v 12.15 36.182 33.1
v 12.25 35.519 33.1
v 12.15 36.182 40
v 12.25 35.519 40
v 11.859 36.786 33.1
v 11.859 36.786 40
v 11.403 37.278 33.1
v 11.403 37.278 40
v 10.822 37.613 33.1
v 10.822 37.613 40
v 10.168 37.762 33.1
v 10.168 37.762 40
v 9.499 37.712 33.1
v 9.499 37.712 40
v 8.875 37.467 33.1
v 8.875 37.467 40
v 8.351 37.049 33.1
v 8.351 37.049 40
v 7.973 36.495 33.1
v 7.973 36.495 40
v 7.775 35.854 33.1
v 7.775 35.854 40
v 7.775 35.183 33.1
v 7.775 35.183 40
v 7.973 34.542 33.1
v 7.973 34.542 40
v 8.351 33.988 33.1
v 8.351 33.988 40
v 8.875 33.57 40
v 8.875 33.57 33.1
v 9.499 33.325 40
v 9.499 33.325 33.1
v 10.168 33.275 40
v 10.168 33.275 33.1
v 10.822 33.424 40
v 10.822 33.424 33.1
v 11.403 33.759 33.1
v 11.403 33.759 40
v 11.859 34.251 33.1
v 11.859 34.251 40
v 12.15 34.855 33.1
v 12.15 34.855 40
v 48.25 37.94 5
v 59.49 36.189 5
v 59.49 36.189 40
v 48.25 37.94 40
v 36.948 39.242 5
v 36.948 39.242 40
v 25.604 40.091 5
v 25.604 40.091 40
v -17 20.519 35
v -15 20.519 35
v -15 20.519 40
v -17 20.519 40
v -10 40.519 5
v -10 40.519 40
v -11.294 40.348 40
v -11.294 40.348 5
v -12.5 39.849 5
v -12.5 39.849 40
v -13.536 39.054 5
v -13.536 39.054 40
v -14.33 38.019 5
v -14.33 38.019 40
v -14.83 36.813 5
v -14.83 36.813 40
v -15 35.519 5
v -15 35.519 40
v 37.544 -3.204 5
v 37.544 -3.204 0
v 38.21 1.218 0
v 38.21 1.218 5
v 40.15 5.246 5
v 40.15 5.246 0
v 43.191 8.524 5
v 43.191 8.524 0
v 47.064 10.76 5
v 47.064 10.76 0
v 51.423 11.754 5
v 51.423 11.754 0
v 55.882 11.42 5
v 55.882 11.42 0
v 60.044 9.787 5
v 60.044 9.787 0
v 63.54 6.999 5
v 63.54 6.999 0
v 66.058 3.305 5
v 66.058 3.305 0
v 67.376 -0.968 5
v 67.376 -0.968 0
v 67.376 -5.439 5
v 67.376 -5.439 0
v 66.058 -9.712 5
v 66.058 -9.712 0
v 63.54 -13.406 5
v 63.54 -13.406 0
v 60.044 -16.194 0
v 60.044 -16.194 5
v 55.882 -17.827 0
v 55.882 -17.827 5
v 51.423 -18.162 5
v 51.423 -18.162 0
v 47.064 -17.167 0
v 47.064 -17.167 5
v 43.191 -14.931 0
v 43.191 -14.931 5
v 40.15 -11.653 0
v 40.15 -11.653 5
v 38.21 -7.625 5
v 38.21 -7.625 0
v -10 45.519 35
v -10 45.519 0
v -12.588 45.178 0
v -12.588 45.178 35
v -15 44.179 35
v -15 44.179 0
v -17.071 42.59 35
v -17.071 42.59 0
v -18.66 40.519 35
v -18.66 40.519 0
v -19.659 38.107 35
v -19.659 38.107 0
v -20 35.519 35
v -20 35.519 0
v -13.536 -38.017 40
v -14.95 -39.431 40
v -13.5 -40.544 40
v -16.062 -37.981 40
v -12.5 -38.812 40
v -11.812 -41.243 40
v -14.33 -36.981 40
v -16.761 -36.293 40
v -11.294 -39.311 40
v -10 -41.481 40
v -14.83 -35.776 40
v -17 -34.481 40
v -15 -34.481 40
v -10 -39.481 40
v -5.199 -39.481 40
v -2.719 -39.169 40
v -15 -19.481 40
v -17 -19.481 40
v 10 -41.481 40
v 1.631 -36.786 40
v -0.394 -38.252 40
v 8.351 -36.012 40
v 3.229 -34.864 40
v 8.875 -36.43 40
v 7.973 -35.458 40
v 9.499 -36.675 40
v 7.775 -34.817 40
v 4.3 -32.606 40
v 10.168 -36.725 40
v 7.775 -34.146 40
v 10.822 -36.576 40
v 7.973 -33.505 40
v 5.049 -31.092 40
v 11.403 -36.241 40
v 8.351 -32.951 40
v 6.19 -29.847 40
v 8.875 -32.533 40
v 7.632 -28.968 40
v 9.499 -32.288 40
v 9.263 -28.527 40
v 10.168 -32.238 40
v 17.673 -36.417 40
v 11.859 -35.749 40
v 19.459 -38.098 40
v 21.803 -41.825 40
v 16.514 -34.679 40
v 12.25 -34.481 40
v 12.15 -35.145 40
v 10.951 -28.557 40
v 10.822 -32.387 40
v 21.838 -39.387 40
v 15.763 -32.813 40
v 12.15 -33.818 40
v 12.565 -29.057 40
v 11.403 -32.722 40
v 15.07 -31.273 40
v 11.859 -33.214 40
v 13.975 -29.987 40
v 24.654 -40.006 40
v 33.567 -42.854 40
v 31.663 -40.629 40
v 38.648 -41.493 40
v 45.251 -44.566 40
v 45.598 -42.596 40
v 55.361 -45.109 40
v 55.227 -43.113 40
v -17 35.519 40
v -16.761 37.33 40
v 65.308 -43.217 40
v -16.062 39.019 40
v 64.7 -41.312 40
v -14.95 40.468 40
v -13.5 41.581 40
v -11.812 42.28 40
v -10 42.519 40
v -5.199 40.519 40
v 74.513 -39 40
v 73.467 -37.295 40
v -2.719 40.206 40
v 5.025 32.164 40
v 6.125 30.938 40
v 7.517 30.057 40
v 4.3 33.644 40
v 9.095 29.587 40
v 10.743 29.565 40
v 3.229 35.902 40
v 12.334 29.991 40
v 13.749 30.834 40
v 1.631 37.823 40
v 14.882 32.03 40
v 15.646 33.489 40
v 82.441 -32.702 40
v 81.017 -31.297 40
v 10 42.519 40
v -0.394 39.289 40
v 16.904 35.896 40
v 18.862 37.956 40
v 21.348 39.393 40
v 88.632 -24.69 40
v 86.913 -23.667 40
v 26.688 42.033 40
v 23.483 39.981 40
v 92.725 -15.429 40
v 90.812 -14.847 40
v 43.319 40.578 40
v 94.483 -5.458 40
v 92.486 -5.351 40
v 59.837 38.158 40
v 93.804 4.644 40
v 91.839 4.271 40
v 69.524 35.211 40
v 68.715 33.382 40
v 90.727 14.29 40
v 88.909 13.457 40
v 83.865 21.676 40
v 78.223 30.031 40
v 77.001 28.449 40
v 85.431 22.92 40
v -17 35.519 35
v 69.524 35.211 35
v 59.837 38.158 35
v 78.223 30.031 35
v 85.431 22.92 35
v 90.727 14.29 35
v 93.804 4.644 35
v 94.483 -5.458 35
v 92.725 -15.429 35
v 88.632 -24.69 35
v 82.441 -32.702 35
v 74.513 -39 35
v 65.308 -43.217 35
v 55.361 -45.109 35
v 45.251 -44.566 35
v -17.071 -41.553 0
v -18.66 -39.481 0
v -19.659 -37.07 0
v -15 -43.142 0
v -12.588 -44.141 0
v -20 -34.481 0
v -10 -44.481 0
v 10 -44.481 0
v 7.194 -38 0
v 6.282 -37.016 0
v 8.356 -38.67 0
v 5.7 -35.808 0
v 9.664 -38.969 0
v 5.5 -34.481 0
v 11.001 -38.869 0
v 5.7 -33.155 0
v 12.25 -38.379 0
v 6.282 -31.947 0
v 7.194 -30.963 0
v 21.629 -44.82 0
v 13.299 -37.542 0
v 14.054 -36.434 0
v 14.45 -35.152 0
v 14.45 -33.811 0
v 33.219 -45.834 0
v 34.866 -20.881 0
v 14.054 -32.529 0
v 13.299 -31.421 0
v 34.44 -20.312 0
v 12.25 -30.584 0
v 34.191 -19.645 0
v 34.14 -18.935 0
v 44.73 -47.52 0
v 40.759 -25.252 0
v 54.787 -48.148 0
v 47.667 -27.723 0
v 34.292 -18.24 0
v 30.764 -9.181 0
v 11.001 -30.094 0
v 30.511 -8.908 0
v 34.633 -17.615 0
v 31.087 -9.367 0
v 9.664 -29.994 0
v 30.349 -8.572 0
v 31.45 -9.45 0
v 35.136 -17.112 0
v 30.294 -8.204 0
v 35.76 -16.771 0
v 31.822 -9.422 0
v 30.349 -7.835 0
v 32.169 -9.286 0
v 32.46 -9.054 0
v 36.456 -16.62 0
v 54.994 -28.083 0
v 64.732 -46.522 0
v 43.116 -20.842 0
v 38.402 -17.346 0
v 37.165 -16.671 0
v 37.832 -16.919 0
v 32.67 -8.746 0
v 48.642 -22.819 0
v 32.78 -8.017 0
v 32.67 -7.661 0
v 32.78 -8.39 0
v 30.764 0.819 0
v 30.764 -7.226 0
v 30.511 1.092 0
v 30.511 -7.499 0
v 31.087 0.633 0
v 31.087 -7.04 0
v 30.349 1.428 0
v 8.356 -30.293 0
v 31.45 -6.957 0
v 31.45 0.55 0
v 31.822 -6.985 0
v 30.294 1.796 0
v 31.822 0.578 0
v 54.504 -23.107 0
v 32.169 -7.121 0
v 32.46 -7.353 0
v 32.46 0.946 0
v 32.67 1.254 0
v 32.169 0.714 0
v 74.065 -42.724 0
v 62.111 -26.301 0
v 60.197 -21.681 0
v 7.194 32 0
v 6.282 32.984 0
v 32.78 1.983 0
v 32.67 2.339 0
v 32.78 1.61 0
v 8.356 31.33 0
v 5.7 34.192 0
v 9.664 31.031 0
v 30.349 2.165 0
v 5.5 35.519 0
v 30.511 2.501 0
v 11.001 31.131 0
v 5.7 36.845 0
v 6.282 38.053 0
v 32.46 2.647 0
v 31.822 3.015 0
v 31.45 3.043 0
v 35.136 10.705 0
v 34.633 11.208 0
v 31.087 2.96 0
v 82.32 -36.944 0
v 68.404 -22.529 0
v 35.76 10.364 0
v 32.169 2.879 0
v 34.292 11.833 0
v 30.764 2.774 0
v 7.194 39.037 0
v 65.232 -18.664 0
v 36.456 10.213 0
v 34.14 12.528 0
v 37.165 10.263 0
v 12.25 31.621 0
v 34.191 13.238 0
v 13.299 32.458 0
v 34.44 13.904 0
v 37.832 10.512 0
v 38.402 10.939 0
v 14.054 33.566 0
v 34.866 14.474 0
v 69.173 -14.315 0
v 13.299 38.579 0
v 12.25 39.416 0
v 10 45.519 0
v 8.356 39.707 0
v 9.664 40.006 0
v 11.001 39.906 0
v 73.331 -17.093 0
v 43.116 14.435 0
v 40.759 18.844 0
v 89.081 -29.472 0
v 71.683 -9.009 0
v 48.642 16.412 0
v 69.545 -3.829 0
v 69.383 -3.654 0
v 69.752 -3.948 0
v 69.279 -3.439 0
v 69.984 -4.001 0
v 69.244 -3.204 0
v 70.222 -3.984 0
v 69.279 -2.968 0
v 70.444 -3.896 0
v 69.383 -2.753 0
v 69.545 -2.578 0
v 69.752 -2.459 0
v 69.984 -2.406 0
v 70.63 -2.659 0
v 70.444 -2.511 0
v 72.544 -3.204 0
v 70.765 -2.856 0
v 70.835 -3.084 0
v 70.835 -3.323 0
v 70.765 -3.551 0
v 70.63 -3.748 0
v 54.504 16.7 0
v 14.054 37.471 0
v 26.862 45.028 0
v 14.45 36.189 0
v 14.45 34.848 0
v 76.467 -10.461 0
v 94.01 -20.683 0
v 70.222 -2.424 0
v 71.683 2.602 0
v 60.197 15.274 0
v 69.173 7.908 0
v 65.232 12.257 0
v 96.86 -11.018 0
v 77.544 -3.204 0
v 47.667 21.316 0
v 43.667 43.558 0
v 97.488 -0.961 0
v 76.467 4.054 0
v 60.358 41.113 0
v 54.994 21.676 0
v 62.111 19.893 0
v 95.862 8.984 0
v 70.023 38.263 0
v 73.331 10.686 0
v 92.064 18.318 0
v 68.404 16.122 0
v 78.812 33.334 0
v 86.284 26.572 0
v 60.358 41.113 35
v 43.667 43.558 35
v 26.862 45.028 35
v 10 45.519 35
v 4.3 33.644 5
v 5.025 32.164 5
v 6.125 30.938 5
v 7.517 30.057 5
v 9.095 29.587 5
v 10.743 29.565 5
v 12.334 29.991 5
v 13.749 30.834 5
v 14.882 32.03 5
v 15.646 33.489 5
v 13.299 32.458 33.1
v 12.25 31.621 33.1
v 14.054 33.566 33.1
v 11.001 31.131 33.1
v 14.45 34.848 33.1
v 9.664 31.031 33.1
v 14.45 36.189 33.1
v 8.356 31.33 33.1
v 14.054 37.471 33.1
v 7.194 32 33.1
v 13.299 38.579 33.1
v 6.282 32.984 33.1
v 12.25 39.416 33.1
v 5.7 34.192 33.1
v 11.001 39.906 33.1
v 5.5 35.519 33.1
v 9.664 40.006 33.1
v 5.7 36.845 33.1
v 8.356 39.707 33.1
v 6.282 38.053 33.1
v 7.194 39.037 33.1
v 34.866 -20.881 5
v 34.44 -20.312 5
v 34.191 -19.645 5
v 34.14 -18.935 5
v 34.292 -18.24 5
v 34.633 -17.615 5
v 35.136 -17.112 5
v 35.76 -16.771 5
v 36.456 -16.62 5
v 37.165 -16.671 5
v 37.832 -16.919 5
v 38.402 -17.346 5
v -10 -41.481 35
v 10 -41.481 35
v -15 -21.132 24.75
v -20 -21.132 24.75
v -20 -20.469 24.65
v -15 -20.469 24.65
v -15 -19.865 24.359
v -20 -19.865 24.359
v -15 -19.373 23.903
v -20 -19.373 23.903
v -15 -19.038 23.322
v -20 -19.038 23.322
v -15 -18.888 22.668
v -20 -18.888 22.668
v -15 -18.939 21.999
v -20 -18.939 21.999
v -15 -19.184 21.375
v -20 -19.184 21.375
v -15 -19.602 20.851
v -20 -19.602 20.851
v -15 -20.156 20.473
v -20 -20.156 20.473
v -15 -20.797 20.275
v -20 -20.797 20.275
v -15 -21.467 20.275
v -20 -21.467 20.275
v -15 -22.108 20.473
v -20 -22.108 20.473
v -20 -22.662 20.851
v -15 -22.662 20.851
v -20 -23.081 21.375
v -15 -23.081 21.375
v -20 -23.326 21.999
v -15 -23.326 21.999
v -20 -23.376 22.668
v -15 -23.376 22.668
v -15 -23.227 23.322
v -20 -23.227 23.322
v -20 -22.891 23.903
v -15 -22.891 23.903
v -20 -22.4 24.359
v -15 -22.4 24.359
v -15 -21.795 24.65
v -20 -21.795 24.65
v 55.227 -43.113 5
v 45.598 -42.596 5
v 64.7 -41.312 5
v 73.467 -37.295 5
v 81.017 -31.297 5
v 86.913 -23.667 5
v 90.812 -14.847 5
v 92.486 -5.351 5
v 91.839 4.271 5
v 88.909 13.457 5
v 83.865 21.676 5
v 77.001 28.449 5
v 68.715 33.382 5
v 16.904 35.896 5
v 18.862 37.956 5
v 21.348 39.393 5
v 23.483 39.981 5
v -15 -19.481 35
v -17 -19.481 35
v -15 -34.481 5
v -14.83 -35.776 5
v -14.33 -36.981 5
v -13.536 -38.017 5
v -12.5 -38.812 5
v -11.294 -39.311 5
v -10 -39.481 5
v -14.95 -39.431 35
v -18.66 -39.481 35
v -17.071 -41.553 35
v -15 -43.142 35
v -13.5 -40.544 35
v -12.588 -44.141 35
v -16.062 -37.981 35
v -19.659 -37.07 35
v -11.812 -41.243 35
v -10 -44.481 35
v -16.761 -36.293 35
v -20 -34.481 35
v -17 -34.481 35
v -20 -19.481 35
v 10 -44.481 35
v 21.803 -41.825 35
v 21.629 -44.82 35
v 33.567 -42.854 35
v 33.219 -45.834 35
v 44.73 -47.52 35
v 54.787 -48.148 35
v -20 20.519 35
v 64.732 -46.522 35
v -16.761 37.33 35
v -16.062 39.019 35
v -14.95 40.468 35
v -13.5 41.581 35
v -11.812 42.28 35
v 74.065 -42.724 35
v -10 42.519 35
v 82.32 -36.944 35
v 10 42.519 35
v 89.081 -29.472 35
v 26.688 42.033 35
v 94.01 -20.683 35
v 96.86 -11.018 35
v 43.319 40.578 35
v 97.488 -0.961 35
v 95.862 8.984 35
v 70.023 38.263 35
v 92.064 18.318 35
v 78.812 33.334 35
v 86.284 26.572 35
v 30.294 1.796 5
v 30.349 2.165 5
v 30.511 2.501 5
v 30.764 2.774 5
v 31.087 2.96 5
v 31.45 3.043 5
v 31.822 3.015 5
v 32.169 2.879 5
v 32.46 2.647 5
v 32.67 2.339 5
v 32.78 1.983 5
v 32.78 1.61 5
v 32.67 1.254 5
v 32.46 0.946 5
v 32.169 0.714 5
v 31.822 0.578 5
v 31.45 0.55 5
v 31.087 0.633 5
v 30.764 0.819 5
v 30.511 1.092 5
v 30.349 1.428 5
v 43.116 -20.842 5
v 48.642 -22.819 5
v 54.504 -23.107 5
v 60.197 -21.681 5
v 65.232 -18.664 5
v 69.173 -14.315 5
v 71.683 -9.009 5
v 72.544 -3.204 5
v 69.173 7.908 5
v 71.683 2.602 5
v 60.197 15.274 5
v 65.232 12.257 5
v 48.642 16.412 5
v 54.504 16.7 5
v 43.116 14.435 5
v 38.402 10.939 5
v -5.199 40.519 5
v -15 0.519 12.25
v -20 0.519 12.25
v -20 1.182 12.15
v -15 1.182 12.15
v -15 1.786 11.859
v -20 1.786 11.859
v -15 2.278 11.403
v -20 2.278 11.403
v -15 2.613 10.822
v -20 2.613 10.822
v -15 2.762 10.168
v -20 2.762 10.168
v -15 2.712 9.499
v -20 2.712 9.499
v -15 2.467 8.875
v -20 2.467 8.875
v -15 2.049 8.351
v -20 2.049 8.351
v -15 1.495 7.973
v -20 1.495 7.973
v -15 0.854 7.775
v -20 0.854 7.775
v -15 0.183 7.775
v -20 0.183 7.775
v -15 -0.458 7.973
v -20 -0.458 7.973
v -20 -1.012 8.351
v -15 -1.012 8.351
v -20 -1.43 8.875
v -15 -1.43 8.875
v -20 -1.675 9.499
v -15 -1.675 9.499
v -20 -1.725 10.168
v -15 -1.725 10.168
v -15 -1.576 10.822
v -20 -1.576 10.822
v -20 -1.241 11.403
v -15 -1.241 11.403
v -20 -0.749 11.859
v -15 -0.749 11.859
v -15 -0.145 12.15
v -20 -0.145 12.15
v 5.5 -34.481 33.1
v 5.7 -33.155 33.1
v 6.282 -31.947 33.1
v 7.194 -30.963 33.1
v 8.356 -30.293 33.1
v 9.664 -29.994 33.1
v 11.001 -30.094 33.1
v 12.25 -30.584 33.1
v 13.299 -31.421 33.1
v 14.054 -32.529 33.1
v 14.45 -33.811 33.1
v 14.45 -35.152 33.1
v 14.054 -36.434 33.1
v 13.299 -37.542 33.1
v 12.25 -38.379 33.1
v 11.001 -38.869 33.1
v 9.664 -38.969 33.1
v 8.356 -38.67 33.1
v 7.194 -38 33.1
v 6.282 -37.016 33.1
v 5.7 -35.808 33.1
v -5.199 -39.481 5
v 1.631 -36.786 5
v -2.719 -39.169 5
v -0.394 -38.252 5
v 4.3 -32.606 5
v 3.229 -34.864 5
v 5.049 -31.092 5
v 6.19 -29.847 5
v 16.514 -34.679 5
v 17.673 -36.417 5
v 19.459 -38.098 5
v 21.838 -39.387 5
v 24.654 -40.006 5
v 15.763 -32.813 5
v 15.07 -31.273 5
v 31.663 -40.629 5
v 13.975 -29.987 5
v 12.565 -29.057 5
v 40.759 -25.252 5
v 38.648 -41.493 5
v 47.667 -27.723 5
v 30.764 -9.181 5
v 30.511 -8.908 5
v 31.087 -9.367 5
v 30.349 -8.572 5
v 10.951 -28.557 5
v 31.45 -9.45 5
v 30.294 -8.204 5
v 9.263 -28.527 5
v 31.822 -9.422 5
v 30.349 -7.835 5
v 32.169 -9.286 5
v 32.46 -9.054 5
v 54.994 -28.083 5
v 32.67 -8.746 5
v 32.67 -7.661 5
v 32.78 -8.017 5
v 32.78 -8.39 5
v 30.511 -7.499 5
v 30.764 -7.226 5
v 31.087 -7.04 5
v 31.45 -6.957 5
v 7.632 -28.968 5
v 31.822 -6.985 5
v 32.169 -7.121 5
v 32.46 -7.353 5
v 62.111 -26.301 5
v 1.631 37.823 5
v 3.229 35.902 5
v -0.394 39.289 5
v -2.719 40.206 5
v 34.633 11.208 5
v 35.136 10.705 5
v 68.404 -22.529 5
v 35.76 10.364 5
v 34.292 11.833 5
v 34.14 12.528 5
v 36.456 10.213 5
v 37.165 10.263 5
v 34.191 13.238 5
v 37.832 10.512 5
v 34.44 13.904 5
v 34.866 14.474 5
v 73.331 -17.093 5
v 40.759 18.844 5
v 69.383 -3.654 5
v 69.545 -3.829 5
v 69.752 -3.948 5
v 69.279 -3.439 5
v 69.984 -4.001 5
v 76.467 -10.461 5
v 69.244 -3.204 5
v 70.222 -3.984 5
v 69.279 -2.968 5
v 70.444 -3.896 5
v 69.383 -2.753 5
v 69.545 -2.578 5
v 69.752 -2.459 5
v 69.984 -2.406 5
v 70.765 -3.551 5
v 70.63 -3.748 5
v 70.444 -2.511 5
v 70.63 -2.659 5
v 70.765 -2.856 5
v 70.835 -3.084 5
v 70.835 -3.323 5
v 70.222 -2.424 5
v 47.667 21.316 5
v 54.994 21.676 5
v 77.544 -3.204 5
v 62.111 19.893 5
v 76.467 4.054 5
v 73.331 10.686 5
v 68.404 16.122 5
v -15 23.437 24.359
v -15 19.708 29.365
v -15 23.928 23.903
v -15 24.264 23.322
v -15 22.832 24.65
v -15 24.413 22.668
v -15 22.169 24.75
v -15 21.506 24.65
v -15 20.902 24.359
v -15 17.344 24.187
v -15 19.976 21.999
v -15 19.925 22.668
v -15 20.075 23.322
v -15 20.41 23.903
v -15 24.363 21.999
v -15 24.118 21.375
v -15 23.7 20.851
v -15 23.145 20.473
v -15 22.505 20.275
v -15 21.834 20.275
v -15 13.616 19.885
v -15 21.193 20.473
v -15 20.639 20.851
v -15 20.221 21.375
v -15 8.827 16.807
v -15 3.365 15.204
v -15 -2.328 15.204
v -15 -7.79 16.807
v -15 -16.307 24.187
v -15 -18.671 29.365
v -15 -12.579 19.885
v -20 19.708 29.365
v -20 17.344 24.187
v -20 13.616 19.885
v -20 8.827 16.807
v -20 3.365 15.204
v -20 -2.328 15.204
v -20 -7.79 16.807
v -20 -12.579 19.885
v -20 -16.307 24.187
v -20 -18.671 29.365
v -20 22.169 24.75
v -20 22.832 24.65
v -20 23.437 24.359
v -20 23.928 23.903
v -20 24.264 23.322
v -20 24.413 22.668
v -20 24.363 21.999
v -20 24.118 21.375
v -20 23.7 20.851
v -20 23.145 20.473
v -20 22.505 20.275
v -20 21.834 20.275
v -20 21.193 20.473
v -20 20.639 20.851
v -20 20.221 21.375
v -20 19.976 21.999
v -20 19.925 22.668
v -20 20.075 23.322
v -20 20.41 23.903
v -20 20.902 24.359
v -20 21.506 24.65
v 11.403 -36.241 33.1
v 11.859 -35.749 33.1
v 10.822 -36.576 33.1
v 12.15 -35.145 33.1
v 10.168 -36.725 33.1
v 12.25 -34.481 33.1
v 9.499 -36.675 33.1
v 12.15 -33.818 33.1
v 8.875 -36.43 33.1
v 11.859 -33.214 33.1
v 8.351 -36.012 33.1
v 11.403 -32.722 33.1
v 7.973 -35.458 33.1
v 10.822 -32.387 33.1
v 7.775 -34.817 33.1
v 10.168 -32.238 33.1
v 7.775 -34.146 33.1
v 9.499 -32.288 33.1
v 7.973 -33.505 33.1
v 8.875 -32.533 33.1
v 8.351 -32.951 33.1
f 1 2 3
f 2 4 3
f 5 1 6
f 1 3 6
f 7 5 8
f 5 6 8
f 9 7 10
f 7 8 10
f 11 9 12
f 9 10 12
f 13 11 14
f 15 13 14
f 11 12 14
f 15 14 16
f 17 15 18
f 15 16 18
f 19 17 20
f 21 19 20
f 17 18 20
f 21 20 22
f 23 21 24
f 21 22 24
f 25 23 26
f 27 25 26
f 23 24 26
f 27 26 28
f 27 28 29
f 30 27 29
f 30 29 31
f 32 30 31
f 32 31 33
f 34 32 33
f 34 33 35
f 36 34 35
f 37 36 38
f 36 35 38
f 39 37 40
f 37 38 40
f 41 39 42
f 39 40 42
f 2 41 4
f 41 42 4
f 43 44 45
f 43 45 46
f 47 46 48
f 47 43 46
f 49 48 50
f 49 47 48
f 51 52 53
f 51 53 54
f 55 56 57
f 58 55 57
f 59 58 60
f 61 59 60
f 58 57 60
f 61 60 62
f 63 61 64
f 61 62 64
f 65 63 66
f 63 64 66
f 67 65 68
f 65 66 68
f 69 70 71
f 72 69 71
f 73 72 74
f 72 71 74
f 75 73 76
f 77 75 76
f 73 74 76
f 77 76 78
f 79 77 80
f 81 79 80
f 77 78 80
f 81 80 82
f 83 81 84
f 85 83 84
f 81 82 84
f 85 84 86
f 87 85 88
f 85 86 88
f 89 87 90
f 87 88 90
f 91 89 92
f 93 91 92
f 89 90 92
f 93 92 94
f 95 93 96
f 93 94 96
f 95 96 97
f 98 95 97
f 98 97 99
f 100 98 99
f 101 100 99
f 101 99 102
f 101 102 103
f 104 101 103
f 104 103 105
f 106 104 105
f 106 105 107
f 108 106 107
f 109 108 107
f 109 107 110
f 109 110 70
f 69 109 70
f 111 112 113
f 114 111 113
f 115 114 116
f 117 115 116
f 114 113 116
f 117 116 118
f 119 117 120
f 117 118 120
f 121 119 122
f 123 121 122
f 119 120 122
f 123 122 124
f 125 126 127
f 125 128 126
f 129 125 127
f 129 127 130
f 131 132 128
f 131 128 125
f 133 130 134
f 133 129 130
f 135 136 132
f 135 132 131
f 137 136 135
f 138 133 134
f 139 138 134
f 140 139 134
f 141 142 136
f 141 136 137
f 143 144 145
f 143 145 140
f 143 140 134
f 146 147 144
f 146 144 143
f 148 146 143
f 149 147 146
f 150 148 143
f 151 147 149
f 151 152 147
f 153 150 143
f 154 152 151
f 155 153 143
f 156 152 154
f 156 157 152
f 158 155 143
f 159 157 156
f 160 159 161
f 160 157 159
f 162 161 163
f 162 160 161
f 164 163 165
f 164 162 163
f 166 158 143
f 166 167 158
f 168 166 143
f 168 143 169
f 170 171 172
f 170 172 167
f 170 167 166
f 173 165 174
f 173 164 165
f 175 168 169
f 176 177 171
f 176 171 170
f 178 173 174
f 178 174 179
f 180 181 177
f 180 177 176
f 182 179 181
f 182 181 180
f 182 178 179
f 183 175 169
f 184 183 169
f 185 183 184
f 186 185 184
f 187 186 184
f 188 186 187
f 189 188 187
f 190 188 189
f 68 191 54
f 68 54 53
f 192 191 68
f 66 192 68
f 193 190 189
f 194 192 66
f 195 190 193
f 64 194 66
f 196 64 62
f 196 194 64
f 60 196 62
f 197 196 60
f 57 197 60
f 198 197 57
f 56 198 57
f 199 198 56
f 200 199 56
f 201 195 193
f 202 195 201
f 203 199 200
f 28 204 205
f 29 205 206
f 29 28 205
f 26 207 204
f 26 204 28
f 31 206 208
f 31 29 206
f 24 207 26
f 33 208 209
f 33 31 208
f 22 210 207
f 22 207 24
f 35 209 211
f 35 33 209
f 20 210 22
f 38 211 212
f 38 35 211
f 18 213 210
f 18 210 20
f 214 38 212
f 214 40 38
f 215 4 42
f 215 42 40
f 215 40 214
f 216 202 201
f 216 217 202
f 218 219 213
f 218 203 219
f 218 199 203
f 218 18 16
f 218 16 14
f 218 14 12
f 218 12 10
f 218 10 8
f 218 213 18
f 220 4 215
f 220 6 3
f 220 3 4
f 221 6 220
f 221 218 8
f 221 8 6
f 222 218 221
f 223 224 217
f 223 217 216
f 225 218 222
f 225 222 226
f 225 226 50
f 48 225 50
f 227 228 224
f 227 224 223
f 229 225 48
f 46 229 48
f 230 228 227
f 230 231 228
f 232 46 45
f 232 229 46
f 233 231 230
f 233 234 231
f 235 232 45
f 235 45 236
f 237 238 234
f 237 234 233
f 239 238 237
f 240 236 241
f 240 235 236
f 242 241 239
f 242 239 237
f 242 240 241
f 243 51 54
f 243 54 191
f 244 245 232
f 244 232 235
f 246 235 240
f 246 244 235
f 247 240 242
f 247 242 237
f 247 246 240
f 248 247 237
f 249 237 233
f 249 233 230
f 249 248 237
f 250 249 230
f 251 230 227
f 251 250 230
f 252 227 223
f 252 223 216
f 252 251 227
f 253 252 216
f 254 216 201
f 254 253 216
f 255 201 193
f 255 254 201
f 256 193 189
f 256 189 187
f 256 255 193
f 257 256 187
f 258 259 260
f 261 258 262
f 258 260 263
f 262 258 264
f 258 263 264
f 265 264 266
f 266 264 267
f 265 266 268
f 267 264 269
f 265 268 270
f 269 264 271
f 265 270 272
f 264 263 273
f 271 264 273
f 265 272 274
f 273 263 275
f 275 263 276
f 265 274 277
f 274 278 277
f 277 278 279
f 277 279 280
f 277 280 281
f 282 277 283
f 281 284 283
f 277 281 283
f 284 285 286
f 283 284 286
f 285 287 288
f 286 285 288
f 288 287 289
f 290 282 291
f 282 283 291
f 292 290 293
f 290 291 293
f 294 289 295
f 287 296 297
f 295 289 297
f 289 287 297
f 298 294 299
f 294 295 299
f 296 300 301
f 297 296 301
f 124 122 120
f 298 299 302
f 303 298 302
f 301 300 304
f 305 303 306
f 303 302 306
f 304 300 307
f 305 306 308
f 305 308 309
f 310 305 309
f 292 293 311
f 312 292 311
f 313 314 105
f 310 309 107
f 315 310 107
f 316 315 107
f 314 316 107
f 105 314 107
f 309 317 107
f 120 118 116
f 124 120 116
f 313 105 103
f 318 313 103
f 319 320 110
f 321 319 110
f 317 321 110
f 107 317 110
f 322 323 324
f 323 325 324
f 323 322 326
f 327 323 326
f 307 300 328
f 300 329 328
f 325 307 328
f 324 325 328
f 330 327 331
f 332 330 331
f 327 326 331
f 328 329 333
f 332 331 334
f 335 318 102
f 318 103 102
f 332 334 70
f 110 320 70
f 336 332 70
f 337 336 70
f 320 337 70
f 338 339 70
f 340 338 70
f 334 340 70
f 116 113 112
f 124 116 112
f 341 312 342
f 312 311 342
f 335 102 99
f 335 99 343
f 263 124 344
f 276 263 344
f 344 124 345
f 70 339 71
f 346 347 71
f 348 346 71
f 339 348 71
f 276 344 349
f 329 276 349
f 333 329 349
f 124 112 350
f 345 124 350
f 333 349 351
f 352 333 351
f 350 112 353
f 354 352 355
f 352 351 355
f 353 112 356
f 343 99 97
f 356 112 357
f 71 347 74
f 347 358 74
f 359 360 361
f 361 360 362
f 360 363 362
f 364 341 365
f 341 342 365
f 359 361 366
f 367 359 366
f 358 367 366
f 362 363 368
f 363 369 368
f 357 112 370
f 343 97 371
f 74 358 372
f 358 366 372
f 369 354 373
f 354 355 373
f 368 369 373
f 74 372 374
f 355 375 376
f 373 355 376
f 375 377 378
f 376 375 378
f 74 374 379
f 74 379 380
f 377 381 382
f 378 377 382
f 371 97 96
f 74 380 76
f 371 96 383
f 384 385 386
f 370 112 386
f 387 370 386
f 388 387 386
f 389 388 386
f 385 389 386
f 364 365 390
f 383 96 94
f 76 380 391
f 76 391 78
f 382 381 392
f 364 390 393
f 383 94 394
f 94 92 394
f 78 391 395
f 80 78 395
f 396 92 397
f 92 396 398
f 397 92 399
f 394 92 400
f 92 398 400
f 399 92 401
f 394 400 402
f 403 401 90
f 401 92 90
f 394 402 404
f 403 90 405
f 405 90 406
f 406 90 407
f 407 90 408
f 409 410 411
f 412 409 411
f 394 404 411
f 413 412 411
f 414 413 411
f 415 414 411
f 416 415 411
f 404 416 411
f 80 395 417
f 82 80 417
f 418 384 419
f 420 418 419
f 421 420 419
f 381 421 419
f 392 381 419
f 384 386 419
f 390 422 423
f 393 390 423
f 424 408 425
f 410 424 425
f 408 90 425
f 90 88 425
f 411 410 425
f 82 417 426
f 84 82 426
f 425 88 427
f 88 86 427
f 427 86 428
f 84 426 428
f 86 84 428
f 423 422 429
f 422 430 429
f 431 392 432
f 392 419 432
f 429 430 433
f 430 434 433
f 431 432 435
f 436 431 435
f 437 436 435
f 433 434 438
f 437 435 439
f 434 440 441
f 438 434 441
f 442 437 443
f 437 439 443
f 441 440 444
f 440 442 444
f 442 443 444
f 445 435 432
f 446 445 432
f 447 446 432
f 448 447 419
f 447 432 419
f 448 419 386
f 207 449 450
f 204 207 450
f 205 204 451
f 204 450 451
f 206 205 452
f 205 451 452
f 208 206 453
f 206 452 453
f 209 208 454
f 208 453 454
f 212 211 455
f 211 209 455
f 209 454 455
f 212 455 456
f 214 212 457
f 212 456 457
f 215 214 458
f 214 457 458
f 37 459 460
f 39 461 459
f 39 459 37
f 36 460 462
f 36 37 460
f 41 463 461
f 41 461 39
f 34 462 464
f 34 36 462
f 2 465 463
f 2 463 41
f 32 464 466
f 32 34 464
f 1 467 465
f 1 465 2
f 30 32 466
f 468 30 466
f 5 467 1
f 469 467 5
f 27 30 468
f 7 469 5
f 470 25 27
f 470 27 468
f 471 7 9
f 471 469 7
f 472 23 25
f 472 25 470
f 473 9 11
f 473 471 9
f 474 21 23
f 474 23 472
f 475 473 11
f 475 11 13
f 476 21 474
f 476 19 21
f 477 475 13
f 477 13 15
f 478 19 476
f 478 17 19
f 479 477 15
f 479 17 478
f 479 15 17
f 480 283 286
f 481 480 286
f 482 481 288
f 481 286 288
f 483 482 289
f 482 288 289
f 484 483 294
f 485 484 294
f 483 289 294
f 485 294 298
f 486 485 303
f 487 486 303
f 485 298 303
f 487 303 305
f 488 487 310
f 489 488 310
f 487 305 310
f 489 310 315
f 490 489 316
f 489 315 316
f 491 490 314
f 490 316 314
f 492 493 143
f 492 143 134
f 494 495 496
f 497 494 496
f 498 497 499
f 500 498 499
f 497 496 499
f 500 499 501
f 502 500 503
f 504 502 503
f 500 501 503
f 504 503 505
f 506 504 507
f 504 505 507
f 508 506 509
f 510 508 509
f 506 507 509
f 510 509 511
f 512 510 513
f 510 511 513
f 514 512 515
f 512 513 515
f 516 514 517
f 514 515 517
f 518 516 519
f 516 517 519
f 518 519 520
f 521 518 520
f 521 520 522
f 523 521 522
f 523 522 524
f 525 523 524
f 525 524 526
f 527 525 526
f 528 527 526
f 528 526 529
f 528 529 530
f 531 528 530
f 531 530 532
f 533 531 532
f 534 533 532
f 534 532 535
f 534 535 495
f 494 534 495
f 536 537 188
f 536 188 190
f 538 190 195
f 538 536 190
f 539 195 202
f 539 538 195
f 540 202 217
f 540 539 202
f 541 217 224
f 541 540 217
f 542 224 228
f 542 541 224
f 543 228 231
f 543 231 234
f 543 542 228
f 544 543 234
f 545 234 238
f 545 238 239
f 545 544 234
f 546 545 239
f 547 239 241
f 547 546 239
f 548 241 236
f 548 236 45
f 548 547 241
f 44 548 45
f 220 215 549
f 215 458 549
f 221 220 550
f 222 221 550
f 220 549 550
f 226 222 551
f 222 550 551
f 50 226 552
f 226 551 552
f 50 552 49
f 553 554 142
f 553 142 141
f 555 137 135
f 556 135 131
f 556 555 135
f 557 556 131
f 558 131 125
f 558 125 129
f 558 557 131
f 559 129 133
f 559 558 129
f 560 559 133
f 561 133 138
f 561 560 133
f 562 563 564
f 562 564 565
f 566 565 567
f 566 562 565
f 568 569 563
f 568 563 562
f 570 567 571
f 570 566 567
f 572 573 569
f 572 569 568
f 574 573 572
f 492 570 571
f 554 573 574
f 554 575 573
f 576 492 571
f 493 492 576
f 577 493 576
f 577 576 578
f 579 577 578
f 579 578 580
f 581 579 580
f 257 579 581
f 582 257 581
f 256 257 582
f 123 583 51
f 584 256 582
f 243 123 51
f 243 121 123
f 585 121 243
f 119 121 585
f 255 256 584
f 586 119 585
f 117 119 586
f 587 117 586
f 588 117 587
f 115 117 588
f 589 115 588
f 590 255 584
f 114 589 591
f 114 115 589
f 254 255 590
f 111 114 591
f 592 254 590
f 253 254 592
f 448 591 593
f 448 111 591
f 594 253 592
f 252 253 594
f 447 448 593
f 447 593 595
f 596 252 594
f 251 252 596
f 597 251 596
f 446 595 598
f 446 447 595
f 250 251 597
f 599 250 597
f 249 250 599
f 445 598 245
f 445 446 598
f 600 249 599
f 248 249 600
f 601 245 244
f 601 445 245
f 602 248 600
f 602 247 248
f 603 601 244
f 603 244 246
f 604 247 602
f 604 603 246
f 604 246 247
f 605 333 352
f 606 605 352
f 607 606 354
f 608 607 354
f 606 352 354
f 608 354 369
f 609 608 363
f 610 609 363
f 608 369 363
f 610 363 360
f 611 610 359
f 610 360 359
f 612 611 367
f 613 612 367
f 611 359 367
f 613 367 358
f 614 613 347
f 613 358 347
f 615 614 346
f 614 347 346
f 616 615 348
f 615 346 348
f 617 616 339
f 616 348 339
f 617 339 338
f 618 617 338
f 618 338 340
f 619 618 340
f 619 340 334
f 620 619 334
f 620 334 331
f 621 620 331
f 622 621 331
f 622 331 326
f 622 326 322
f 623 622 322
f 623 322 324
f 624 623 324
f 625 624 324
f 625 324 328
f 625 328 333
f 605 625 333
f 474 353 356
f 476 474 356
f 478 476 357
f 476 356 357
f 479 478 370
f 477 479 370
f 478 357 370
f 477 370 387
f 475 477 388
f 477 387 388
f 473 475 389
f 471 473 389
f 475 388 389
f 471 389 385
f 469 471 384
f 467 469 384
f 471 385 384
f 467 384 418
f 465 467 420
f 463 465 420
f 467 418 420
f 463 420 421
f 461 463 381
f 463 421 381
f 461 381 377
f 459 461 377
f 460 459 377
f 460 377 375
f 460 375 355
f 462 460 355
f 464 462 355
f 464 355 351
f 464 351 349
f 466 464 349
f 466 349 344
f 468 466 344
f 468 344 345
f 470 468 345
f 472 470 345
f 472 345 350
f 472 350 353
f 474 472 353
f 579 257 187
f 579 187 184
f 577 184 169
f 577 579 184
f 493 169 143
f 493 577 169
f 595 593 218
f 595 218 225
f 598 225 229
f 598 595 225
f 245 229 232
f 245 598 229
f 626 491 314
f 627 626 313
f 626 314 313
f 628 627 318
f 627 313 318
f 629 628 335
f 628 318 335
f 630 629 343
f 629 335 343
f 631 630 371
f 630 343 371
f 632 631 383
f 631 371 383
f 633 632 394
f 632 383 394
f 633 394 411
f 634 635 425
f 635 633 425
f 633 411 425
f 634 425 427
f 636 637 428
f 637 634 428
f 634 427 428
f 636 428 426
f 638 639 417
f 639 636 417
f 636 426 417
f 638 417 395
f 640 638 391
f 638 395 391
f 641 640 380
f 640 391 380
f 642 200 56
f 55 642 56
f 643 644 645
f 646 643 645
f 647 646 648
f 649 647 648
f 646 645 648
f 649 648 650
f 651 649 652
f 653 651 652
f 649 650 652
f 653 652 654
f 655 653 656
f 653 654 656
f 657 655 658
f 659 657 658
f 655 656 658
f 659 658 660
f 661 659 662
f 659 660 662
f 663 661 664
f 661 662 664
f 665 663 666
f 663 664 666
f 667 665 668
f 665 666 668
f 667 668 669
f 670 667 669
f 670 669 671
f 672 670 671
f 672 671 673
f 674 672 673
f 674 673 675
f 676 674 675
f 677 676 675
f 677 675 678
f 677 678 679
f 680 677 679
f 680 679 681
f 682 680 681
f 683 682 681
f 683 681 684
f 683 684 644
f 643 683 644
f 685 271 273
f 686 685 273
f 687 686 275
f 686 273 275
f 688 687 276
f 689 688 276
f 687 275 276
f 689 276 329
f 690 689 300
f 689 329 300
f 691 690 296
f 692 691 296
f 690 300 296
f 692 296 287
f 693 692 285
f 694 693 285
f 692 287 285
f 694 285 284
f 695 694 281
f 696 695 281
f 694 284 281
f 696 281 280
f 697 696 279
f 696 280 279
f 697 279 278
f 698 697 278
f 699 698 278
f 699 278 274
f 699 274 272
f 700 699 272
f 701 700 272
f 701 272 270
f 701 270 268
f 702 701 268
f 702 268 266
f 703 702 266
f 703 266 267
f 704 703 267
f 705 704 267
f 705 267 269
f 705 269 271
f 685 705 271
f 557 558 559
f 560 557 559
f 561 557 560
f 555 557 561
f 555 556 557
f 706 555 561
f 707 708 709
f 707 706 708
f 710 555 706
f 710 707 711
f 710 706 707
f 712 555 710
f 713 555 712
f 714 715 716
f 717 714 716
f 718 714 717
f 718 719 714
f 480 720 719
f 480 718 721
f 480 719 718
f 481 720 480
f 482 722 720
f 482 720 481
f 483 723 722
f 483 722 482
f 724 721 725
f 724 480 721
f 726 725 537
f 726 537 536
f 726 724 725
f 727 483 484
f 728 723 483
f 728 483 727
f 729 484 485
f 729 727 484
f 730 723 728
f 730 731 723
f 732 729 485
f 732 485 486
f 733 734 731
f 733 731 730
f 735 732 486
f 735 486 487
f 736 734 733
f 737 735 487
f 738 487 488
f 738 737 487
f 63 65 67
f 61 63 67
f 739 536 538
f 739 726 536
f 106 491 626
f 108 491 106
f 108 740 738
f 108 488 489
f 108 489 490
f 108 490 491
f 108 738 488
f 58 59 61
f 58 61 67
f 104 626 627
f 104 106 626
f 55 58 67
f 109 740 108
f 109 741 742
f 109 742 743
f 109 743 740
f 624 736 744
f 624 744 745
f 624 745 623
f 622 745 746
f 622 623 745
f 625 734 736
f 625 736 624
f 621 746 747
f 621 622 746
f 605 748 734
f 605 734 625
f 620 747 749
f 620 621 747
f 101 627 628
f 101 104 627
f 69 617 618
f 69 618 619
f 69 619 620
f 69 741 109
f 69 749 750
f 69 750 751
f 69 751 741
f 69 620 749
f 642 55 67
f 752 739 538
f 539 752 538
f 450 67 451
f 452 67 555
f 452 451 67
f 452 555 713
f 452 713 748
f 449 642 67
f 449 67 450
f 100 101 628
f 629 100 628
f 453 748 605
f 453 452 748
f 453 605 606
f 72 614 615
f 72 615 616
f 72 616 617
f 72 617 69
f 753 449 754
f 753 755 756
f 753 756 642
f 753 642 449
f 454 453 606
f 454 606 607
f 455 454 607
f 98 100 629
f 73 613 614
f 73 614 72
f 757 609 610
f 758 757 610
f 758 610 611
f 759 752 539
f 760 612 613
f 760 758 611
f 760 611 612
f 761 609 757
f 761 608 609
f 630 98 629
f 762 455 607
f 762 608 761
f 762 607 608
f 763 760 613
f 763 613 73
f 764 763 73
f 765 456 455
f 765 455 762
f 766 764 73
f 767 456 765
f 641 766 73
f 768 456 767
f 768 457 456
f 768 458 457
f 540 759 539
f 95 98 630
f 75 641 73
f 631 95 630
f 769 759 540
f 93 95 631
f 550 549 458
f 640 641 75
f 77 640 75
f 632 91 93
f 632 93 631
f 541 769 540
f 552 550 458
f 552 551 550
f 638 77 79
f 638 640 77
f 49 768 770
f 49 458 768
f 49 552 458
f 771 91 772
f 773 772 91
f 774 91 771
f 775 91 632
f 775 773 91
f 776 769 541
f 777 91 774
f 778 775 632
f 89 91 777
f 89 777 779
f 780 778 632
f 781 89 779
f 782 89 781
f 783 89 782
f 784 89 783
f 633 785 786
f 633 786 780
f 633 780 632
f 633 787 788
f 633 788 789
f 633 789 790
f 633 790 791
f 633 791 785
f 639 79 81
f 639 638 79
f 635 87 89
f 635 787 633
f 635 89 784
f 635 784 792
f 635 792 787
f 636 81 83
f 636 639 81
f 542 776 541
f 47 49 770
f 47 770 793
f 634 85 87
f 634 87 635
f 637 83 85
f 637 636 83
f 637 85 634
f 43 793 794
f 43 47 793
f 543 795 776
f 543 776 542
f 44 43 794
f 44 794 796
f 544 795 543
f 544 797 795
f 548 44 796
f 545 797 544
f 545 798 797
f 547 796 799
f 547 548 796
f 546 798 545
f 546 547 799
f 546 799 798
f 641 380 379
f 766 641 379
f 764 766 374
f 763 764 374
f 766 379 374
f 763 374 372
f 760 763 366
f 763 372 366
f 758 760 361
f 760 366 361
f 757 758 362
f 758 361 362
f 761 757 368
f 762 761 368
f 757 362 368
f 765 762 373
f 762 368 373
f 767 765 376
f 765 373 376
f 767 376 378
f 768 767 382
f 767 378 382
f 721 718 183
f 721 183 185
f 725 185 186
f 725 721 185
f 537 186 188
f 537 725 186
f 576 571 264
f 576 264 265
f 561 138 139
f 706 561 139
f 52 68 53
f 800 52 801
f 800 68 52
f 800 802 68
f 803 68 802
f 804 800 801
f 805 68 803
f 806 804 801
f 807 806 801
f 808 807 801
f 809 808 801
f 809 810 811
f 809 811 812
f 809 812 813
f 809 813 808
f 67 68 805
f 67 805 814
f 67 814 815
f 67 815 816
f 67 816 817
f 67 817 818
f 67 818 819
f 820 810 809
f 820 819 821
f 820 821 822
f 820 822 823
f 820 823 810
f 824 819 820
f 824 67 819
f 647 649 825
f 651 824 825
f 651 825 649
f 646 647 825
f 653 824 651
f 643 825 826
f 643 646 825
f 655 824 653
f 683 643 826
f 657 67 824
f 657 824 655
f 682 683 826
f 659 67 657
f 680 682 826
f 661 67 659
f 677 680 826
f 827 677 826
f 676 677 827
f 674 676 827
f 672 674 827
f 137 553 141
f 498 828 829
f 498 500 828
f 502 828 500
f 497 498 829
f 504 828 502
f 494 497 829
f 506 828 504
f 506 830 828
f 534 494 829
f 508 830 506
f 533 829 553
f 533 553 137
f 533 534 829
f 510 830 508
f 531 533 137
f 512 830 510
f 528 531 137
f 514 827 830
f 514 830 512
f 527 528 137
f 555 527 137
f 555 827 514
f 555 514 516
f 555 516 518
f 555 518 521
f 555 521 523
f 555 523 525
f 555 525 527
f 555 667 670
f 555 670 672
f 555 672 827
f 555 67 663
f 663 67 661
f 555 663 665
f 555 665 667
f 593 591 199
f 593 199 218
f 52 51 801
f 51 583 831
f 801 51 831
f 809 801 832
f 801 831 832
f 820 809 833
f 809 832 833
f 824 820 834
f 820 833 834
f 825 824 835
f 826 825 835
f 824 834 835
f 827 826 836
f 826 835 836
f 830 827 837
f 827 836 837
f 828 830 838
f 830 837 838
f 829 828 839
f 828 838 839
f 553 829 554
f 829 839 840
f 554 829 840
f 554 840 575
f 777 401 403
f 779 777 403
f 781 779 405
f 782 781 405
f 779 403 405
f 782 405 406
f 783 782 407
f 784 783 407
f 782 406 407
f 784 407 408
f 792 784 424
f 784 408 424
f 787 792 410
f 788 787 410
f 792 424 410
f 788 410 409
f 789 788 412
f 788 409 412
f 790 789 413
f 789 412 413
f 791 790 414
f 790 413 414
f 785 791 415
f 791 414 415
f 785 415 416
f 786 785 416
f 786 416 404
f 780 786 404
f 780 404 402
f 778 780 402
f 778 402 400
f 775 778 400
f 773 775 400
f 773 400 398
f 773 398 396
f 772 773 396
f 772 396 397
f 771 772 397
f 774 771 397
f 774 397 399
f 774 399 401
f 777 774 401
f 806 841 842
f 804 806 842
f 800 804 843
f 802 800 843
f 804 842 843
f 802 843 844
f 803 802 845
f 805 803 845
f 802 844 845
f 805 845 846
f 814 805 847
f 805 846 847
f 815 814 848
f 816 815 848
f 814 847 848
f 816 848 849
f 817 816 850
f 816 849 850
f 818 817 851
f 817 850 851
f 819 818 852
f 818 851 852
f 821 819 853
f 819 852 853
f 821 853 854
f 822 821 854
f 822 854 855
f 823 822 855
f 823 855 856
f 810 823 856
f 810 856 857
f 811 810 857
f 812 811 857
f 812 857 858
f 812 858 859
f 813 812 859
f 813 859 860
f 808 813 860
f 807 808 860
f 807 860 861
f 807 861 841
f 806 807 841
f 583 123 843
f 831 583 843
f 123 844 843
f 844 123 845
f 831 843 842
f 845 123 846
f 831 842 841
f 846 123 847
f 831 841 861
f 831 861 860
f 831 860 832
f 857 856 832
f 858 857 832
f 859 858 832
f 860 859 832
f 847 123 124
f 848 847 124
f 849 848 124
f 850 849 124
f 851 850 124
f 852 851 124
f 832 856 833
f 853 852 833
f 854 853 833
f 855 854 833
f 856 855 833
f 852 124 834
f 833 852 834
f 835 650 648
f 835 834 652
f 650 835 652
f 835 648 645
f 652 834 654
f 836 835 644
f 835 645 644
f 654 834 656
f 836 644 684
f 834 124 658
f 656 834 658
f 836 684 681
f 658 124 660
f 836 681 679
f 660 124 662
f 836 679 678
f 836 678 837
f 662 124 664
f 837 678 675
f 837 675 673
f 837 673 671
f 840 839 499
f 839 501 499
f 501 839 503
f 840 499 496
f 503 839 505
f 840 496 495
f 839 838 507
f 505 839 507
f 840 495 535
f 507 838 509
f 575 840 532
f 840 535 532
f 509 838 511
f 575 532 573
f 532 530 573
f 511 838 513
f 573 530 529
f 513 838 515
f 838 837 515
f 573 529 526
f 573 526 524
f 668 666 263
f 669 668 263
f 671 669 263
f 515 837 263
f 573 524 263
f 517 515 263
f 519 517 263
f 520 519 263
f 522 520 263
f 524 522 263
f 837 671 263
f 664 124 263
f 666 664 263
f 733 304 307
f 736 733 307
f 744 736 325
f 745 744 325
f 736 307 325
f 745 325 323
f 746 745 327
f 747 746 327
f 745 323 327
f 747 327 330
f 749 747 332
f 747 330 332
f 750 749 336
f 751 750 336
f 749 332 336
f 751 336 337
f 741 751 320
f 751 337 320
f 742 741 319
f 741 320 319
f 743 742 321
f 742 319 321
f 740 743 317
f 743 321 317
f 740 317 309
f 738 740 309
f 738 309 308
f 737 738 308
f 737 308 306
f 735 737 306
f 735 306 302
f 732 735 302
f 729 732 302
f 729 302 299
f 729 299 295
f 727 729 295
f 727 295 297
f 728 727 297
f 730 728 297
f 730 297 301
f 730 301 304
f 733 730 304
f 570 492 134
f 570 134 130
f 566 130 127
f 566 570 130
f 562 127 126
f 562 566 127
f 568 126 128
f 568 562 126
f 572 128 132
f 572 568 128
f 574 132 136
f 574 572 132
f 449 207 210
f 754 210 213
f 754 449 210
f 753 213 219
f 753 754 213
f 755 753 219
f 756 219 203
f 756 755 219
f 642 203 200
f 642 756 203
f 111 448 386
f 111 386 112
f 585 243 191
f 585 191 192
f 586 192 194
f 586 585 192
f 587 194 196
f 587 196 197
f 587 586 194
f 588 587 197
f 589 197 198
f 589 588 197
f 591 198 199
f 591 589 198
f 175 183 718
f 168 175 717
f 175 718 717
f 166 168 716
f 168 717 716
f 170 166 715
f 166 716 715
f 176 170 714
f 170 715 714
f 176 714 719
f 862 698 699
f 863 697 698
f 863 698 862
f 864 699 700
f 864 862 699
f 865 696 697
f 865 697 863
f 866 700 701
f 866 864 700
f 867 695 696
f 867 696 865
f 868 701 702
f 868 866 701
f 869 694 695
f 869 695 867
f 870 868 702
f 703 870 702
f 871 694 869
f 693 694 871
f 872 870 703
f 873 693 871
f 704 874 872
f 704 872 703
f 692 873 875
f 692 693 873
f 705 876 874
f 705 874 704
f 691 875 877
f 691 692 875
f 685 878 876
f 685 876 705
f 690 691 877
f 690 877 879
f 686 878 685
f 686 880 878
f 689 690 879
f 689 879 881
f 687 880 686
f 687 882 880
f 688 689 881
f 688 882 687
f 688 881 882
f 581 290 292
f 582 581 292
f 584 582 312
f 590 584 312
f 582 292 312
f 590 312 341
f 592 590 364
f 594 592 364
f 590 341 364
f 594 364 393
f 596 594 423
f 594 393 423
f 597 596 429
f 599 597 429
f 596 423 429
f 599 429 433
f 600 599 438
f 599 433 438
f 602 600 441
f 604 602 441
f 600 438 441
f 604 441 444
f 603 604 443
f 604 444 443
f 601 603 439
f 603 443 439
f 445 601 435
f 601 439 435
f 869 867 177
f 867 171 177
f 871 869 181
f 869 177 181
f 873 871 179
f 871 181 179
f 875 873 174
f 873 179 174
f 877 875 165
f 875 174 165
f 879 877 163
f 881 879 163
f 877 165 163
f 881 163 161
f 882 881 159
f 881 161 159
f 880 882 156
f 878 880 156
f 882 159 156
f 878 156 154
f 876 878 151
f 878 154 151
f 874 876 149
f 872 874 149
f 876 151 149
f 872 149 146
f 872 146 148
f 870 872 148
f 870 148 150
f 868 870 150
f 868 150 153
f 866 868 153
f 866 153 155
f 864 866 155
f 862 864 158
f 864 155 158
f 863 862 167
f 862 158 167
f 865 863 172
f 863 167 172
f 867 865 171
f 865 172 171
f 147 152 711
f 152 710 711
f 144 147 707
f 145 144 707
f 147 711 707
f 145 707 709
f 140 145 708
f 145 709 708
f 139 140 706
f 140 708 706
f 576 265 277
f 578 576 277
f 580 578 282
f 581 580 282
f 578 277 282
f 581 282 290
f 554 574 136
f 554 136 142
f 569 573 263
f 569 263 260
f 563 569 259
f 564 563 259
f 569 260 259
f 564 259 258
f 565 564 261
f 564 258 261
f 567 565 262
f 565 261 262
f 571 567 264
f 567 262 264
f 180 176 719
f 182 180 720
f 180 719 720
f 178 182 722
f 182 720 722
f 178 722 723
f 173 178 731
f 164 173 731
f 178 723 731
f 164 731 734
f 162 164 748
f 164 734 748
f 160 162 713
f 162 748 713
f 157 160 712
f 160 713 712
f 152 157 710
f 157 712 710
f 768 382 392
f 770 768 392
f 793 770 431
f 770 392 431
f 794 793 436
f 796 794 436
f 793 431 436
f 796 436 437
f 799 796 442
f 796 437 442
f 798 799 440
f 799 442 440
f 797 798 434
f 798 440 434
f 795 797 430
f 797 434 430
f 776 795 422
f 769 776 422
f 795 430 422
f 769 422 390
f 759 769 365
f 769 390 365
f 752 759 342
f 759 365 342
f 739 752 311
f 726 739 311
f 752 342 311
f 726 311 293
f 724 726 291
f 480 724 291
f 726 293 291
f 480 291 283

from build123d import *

# Parameters (mm, degrees)
EXTRUDE_1_DEPTH              = 35
CUT_EXTRUDE_1_DEPTH          = 30
SKETCH_3_R                   = 20
SKETCH_3_R_2                 = 2.25
CUT_EXTRUDE_2_DEPTH          = 10
SKETCH_4_R                   = 15
CUT_EXTRUDE_3_DEPTH          = 1
CUT_EXTRUDE_3_DEPTH_BACK     = 36
EXTRUDE_2_DEPTH              = 5
CUT_EXTRUDE_6_REACH          = 42
SKETCH_12_R                  = 6
EXTRUDE_3_DEPTH              = 35
FILLET_1_R                   = 10
HOLE_WIZARD_M2_1_D           = 1.6
HOLE_WIZARD_M2_1_DEPTH       = 5
HOLE_WIZARD_M3_1_D           = 2.5
HOLE_WIZARD_M3_1_DEPTH       = 5
HOLE_WIZARD_M4_6_D           = 4.5
HOLE_WIZARD_M4_6_DEPTH       = 40
HOLE_WIZARD_M4_6_CBORE_D     = 9
HOLE_WIZARD_M4_6_CBORE_DEPTH = 33.1
HOLE_WIZARD_M4_6_TIP         = 1.351936393


with BuildPart() as part:
    # 스케치1 → 보스-돌출1 (new body)
    with BuildSketch(Plane.XY):
        with BuildLine():
            Line((10, 45.518523903), (0, 45.518523903))
            Line((0, 45.518523903), (-10, 45.518523903))
            ThreePointArc((-10, 45.518523903), (-17.071067812, 42.589591715), (-20, 35.518523903))
            Line((-20, 35.518523903), (-20, -34.481476097))
            ThreePointArc((-20, -34.481476097), (-17.071067812, -41.552543909), (-10, -44.481476097))
            Line((-10, -44.481476097), (0, -44.481476097))
            Line((0, -44.481476097), (10, -44.481476097))
            ThreePointArc((10, -44.481476097), (27.43114855, -45.242536479), (44.729635533, -47.519925495))
            ThreePointArc((44.729635533, -47.519925495), (96.860152414, -11.017744604), (60.357971523, 41.112772276))
            ThreePointArc((60.357971523, 41.112772276), (35.275165397, 44.414986349), (10, 45.518523903))
        make_face()
    extrude(amount=EXTRUDE_1_DEPTH)

    # 스케치2 → 컷-돌출1 (cut)
    with BuildSketch(Plane.XY.offset(35)):
        with BuildLine():
            Line((10, 40.518523903), (-10, 40.518523903))
            ThreePointArc((-10, 40.518523903), (-13.535533906, 39.054057809), (-15, 35.518523903))
            Line((-15, 35.518523903), (-15, -34.481476097))
            ThreePointArc((-15, -34.481476097), (-13.535533906, -38.017010003), (-10, -39.481476097))
            Line((-10, -39.481476097), (10, -39.481476097))
            ThreePointArc((10, -39.481476097), (27.866927263, -40.261562989), (45.597876422, -42.59588673))
            ThreePointArc((45.597876422, -42.59588673), (91.936113649, -10.149503716), (59.489730635, 36.188733511))
            ThreePointArc((59.489730635, 36.188733511), (34.839386683, 39.434012859), (10, 40.518523903))
        make_face()
    extrude(amount=-CUT_EXTRUDE_1_DEPTH, mode=Mode.SUBTRACT)

    # 스케치3 → 컷-돌출2 (cut)
    with BuildSketch(Plane.ZY.offset(20)):
        with Locations((35, 0.518523903)):
            Circle(SKETCH_3_R)
        with Locations((22.5, 22.169158997)):
            Circle(SKETCH_3_R_2)
        with Locations((10, 0.518523903)):
            Circle(SKETCH_3_R_2)
        with Locations((22.5, -21.132111192)):
            Circle(SKETCH_3_R_2)
    extrude(amount=-CUT_EXTRUDE_2_DEPTH, mode=Mode.SUBTRACT)

    # 스케치4 → 컷-돌출3 (cut, two sides)
    with BuildSketch(Plane(origin=(0, 0, 0), x_dir=(-1, 0, 0), z_dir=(0, 0, -1))) as cut_extrude_3_sk:
        with Locations((-52.543803528, -3.203576609)):
            Circle(SKETCH_4_R)
    extrude(amount=CUT_EXTRUDE_3_DEPTH, mode=Mode.SUBTRACT)
    extrude(cut_extrude_3_sk.sketch, amount=-CUT_EXTRUDE_3_DEPTH_BACK, mode=Mode.SUBTRACT)

    # 스케치8 → 보스-돌출2 (add)
    with BuildSketch(Plane.XY.offset(35)):
        with BuildLine():
            Line((-15, -19.481476097), (-15, -34.481476097))
            ThreePointArc((-15, -34.481476097), (-13.535533906, -38.017010003), (-10, -39.481476097))
            Line((-10, -39.481476097), (10, -39.481476097))
            ThreePointArc((10, -39.481476097), (27.866927263, -40.261562989), (45.597876422, -42.59588673))
            ThreePointArc((45.597876422, -42.59588673), (91.936113649, -10.149503716), (59.489730635, 36.188733511))
            ThreePointArc((59.489730635, 36.188733511), (34.839386683, 39.434012859), (10, 40.518523903))
            Line((10, 40.518523903), (-10, 40.518523903))
            ThreePointArc((-10, 40.518523903), (-13.535533906, 39.054057809), (-15, 35.518523903))
            Line((-15, 35.518523903), (-15, 20.518523903))
            Line((-15, 20.518523903), (-17, 20.518523903))
            Line((-17, 20.518523903), (-17, 35.518523903))
            ThreePointArc((-17, 35.518523903), (-14.949747468, 40.468271371), (-10, 42.518523903))
            Line((-10, 42.518523903), (10, 42.518523903))
            ThreePointArc((10, 42.518523903), (35.013698169, 41.426402255), (59.83702699, 38.158349017))
            ThreePointArc((59.83702699, 38.158349017), (93.905729155, -10.496800071), (45.250580066, -44.565502236))
            ThreePointArc((45.250580066, -44.565502236), (27.692615778, -42.253952385), (10, -41.481476097))
            Line((10, -41.481476097), (-10, -41.481476097))
            ThreePointArc((-10, -41.481476097), (-14.949747468, -39.431223566), (-17, -34.481476097))
            Line((-17, -34.481476097), (-17, -19.481476097))
            Line((-17, -19.481476097), (-15, -19.481476097))
        make_face()
    extrude(amount=EXTRUDE_2_DEPTH)

    # 스케치9 → 컷-돌출6 (cut, up to next)
    with BuildSketch(Plane(origin=(0, 0, 0), x_dir=(-1, 0, 0), z_dir=(0, 0, -1)), mode=Mode.PRIVATE) as cut_extrude_6_sk1:
        with BuildLine():
            ThreePointArc((-38.401667905, 10.938559014), (-34.866133999, 10.938559014), (-34.866133999, 14.47409292))
            ThreePointArc((-34.866133999, 14.47409292), (-77.543803528, -3.203576609), (-34.866133999, -20.881246139))
            ThreePointArc((-34.866133999, -20.881246139), (-34.866133999, -17.345712233), (-38.401667905, -17.345712233))
            ThreePointArc((-38.401667905, -17.345712233), (-72.543803528, -3.203576609), (-38.401667905, 10.938559014))
        make_face()
    cut_extrude_6_tool1 = extrude(cut_extrude_6_sk1.sketch, amount=-CUT_EXTRUDE_6_REACH, mode=Mode.PRIVATE) & part.part
    add(cut_extrude_6_tool1.solids().sort_by_distance((35.334344, -17.813923, 0))[0], mode=Mode.SUBTRACT)

    # 스케치12 → 보스-돌출3 (add)
    with BuildSketch(Plane.XY.offset(5)):
        with Locations((10, 35.518523903)):
            Circle(SKETCH_12_R)
        with Locations((10, -34.481476097)):
            Circle(SKETCH_12_R)
    extrude(amount=EXTRUDE_3_DEPTH)

    # 필렛1
    fillet_1_edges = [part.edges().sort_by_distance(p)[0] for p in [
        (13.346048824, 40.498881046, 22.5),
        (6.68337521, 40.518523903, 22.5),
        (13.276798635, -39.507666574, 22.5),
        (6.68337521, -39.481476097, 22.5),
    ]]
    fillet(fillet_1_edges, radius=FILLET_1_R)

    # M2 나사 구멍1
    with Locations(Plane.XY.offset(5)):
        with Locations((70.043803528, -3.203576609)):
            Hole(HOLE_WIZARD_M2_1_D / 2, depth=HOLE_WIZARD_M2_1_DEPTH)

    # M3 나사 구멍1
    with Locations(Plane.XY.offset(5)):
        with Locations((31.543803528, 1.796423391), (31.543803528, -8.203576609)):
            Hole(HOLE_WIZARD_M3_1_D / 2, depth=HOLE_WIZARD_M3_1_DEPTH)

    # M4 남비 머리 나사용 카운터보어6
    with Locations(Plane(origin=(0, 0, 0), x_dir=(-1, 0, 0), z_dir=(0, 0, -1))):
        with Locations((-10, 35.518523903), (-10, -34.481476097)):
            CounterBoreHole(HOLE_WIZARD_M4_6_D / 2, HOLE_WIZARD_M4_6_CBORE_D / 2, HOLE_WIZARD_M4_6_CBORE_DEPTH, depth=HOLE_WIZARD_M4_6_DEPTH)
            with Locations((0, 0, -(HOLE_WIZARD_M4_6_DEPTH + HOLE_WIZARD_M4_6_TIP / 2))):  # 118° drill point
                Cone(0, HOLE_WIZARD_M4_6_D / 2, HOLE_WIZARD_M4_6_TIP, mode=Mode.SUBTRACT)


solid = part.part
